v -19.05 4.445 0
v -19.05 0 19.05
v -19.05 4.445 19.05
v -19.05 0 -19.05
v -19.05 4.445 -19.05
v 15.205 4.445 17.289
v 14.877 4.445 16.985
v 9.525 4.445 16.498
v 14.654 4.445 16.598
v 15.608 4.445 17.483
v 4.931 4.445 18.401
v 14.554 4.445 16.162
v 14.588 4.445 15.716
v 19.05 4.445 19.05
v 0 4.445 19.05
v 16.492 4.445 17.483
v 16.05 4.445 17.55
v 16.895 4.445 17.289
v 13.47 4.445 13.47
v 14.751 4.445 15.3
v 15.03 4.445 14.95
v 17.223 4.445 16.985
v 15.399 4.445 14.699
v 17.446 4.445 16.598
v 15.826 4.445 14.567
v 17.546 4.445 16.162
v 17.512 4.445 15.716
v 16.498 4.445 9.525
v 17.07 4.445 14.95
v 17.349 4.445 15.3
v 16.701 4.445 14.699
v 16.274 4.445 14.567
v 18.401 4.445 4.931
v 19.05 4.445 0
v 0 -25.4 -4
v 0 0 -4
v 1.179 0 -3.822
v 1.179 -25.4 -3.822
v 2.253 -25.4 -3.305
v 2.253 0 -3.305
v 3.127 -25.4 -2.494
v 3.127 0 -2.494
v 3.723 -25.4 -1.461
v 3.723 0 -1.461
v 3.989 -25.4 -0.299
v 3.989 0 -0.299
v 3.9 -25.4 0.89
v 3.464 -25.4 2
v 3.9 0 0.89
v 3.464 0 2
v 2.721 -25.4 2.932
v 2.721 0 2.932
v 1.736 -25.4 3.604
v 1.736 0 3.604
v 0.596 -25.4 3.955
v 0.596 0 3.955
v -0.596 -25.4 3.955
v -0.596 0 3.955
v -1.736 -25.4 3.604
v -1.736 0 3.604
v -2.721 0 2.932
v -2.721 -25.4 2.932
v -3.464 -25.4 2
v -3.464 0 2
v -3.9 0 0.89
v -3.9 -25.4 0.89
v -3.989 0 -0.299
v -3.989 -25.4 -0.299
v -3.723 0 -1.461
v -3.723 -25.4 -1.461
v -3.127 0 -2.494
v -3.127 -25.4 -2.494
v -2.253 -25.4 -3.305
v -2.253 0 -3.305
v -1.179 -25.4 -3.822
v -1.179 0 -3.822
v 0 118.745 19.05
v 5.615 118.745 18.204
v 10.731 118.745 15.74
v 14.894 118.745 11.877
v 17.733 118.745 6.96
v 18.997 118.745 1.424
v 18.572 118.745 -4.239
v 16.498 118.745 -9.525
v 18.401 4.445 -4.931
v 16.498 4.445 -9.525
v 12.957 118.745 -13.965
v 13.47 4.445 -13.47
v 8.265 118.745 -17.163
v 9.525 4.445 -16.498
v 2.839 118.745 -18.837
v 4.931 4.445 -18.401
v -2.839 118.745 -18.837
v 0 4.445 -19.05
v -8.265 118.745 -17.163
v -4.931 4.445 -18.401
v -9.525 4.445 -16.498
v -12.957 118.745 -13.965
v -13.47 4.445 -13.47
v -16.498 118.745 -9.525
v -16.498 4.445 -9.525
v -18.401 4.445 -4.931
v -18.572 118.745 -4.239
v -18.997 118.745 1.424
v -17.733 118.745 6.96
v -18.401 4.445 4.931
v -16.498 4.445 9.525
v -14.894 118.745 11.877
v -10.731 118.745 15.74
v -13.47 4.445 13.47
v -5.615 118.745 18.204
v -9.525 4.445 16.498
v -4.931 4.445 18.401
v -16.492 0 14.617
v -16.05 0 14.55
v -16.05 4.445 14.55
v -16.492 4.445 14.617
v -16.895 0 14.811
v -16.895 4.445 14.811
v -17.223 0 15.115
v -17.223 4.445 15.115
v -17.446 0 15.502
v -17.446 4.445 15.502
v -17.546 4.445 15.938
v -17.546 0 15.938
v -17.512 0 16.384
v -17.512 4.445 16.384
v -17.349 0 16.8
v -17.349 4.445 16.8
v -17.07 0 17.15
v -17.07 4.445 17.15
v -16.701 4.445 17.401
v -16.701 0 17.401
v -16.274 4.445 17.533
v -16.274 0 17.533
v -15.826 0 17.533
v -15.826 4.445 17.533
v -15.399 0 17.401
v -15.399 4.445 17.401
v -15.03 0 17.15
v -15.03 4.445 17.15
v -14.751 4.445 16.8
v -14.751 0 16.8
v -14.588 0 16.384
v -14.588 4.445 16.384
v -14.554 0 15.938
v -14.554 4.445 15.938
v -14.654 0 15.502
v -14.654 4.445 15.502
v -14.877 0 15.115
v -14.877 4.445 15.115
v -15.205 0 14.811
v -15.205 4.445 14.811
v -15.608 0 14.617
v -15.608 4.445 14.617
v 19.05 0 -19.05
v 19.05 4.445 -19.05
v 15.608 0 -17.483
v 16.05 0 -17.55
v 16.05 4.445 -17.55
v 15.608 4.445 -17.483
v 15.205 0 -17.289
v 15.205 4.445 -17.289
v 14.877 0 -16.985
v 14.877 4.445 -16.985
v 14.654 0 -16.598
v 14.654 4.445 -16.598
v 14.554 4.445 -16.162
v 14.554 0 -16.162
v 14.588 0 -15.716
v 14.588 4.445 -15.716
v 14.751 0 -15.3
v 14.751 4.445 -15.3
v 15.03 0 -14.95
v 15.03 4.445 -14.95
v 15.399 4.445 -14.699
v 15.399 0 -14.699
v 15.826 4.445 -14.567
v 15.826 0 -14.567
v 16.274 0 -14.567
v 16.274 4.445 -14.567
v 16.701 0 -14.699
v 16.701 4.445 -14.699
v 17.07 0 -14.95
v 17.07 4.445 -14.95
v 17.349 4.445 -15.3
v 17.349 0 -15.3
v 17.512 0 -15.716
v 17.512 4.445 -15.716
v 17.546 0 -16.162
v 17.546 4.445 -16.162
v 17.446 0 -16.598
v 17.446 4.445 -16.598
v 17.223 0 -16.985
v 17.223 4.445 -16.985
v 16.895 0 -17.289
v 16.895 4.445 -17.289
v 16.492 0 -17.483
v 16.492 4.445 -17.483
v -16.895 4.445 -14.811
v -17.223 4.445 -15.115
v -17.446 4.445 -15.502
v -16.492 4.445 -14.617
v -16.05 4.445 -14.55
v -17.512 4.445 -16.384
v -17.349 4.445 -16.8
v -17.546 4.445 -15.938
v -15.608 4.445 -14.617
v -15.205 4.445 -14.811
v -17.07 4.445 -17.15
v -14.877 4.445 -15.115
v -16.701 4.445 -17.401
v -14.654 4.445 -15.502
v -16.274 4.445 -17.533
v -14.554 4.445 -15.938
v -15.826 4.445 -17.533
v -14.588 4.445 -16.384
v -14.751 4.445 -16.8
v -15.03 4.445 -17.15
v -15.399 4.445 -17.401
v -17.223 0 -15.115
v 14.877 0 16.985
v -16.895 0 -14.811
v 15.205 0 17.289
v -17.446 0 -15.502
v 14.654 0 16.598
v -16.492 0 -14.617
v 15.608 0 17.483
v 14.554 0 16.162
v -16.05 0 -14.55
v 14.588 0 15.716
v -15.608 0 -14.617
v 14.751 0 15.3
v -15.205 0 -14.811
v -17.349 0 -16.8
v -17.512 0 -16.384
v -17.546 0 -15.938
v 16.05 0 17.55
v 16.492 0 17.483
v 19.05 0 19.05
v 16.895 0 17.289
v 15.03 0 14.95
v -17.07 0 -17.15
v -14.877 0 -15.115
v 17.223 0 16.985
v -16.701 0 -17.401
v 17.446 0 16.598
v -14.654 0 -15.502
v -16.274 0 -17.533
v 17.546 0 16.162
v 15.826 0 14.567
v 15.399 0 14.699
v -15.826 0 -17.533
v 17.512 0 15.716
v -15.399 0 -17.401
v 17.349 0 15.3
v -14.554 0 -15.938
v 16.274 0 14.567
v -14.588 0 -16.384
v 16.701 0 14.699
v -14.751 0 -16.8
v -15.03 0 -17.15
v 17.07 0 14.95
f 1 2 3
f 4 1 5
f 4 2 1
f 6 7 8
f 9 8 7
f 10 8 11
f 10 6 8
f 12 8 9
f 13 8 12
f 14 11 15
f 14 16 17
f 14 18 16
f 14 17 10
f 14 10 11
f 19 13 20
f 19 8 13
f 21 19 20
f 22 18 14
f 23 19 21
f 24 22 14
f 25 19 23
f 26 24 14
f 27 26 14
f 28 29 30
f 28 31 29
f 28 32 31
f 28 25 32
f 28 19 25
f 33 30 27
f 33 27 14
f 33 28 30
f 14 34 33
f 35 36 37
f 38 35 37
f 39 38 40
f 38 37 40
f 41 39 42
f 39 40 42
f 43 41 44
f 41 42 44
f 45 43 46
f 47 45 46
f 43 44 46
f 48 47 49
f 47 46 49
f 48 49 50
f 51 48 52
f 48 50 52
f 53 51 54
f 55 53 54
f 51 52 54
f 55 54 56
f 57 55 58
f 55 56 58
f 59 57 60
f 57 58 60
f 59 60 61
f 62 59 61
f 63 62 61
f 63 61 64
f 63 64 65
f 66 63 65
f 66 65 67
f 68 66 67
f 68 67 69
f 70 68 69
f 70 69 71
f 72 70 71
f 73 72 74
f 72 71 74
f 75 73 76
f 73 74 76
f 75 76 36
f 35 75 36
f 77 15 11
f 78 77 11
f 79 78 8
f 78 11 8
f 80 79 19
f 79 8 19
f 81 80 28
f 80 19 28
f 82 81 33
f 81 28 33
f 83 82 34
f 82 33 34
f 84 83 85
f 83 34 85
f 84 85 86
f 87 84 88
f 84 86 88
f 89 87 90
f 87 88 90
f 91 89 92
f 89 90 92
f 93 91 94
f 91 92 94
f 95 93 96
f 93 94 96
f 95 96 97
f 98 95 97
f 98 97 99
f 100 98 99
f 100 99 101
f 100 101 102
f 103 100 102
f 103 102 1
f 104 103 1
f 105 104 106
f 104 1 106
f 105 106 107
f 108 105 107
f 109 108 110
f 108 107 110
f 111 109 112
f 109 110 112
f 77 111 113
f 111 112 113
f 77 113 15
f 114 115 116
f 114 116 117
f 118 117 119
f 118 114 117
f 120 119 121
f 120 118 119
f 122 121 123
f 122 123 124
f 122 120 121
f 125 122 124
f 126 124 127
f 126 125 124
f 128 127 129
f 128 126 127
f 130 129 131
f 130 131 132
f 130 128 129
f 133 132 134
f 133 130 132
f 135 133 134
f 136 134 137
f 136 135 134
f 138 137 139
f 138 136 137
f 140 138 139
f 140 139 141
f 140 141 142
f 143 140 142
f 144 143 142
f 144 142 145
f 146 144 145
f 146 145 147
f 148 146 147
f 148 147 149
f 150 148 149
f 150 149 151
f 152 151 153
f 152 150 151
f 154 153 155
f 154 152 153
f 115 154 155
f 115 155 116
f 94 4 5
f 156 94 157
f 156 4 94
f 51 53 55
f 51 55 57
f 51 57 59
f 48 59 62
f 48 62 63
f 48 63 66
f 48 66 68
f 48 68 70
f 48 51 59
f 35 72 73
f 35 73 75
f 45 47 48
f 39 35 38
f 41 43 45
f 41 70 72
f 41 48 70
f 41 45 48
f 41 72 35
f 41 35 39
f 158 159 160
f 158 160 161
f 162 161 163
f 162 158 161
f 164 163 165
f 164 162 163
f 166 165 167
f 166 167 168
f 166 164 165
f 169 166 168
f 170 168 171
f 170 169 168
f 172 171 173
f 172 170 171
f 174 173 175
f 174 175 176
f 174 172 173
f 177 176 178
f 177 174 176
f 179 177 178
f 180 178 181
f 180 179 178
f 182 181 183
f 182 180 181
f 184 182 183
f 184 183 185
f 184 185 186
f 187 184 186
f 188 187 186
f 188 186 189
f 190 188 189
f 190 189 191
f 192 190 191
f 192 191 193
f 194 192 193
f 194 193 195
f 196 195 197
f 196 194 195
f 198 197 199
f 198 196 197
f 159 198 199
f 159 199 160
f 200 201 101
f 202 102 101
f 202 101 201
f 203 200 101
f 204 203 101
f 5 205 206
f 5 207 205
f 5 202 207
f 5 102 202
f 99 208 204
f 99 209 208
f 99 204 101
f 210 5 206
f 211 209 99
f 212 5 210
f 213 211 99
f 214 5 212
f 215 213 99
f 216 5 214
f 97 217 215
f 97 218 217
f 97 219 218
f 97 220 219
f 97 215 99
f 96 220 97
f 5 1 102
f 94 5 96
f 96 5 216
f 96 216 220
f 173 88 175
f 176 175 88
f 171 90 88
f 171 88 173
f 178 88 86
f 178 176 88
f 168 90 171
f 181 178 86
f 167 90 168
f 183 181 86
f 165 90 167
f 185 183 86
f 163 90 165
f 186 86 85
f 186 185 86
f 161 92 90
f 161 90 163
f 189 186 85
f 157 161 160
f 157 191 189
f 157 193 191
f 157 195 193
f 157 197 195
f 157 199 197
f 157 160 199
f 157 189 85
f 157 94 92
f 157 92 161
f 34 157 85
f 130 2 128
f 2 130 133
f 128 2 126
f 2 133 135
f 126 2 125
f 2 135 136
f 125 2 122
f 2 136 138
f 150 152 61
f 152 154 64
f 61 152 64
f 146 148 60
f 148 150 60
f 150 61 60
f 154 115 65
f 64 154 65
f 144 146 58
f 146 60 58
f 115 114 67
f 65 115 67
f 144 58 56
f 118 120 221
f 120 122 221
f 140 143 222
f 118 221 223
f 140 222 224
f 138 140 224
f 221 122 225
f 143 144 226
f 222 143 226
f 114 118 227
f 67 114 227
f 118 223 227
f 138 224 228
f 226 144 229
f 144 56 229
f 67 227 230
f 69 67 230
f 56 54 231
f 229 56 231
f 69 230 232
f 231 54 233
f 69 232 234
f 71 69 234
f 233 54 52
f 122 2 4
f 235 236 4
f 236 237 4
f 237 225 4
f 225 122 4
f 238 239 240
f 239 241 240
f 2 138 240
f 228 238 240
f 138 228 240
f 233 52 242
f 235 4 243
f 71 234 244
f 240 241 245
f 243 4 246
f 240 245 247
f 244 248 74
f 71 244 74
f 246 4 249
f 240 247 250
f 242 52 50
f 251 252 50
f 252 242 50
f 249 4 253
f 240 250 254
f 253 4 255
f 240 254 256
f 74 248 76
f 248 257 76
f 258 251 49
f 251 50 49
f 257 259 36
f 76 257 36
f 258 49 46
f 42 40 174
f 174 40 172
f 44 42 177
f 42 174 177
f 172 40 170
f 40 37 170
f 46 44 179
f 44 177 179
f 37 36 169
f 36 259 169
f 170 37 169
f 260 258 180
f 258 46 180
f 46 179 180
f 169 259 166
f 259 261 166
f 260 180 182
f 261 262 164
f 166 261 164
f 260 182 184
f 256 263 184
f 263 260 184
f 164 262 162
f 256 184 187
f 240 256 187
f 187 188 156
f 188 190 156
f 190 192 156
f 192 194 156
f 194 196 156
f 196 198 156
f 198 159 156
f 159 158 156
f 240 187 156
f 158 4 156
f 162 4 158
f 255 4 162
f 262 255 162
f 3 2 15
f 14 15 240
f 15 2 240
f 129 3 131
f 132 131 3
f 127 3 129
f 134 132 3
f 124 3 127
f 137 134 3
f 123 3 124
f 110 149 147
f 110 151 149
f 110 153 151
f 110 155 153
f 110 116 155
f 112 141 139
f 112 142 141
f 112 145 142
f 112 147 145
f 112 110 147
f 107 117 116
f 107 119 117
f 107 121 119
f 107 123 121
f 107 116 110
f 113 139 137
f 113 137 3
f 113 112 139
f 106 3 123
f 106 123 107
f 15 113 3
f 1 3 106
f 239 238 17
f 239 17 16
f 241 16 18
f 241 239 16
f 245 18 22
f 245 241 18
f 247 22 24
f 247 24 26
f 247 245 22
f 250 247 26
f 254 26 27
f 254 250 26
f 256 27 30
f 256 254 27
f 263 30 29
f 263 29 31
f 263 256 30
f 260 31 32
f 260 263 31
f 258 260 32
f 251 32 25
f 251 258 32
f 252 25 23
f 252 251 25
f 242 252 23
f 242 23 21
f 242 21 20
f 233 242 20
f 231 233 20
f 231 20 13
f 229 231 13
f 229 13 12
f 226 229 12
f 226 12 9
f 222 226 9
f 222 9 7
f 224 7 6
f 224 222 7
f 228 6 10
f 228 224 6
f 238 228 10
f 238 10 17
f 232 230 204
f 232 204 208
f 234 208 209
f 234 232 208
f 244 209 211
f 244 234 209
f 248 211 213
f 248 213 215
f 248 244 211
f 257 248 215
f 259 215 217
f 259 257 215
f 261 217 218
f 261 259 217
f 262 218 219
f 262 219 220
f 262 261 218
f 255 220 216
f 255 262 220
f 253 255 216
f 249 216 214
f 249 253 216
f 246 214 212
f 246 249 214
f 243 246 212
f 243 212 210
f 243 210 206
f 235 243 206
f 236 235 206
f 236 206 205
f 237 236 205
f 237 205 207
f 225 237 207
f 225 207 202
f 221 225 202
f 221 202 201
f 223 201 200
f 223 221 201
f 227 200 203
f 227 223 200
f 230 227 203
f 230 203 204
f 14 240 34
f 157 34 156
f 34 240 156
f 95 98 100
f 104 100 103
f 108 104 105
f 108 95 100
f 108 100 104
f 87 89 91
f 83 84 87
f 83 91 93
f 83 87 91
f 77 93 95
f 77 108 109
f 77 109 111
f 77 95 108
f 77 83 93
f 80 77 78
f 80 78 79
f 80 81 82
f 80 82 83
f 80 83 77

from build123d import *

# Parameters (mm, degrees)
SKETCH1_W           = 38.1
SKETCH1_H           = 38.1
SKETCH1_R           = 1.499997
BOSS_EXTRUDE1_DEPTH = 4.445
SKETCH2_R           = 19.05
BOSS_EXTRUDE2_DEPTH = 114.3
SKETCH3_R           = 4
BOSS_EXTRUDE3_DEPTH = 25.4


with BuildPart() as part:
    # Sketch1 → Boss-Extrude1 (new body)
    with BuildSketch(Plane(origin=(0, 0, 0), x_dir=(1, 0, 0), z_dir=(0, 1, 0))):
        Rectangle(SKETCH1_W, SKETCH1_H)
        with Locations(Location((-16.050006, 16.050006, 0), (0, 0, 270))):
            Circle(SKETCH1_R, mode=Mode.SUBTRACT)
        with Locations(Location((16.050006, 16.050006, 0), (0, 0, 90))):
            Circle(SKETCH1_R, mode=Mode.SUBTRACT)
        with Locations(Location((16.050006, -16.050006, 0), (0, 0, 270))):
            Circle(SKETCH1_R, mode=Mode.SUBTRACT)
        with Locations(Location((-16.050006, -16.050006, 0), (0, 0, 90))):
            Circle(SKETCH1_R, mode=Mode.SUBTRACT)
    extrude(amount=BOSS_EXTRUDE1_DEPTH)

    # Sketch2 → Boss-Extrude2 (add)
    with BuildSketch(Plane(origin=(0, 4.445, 0), x_dir=(1, 0, 0), z_dir=(0, 1, 0))):
        with Locations(Location((0, 0, 0), (0, 0, 270))):
            Circle(SKETCH2_R)
    extrude(amount=BOSS_EXTRUDE2_DEPTH)

    # Sketch3 → Boss-Extrude3 (add)
    with BuildSketch(Plane.XZ):
        with Locations(Location((0, 0, 0), (0, 0, 270))):
            Circle(SKETCH3_R)
    extrude(amount=BOSS_EXTRUDE3_DEPTH)


solid = part.part
